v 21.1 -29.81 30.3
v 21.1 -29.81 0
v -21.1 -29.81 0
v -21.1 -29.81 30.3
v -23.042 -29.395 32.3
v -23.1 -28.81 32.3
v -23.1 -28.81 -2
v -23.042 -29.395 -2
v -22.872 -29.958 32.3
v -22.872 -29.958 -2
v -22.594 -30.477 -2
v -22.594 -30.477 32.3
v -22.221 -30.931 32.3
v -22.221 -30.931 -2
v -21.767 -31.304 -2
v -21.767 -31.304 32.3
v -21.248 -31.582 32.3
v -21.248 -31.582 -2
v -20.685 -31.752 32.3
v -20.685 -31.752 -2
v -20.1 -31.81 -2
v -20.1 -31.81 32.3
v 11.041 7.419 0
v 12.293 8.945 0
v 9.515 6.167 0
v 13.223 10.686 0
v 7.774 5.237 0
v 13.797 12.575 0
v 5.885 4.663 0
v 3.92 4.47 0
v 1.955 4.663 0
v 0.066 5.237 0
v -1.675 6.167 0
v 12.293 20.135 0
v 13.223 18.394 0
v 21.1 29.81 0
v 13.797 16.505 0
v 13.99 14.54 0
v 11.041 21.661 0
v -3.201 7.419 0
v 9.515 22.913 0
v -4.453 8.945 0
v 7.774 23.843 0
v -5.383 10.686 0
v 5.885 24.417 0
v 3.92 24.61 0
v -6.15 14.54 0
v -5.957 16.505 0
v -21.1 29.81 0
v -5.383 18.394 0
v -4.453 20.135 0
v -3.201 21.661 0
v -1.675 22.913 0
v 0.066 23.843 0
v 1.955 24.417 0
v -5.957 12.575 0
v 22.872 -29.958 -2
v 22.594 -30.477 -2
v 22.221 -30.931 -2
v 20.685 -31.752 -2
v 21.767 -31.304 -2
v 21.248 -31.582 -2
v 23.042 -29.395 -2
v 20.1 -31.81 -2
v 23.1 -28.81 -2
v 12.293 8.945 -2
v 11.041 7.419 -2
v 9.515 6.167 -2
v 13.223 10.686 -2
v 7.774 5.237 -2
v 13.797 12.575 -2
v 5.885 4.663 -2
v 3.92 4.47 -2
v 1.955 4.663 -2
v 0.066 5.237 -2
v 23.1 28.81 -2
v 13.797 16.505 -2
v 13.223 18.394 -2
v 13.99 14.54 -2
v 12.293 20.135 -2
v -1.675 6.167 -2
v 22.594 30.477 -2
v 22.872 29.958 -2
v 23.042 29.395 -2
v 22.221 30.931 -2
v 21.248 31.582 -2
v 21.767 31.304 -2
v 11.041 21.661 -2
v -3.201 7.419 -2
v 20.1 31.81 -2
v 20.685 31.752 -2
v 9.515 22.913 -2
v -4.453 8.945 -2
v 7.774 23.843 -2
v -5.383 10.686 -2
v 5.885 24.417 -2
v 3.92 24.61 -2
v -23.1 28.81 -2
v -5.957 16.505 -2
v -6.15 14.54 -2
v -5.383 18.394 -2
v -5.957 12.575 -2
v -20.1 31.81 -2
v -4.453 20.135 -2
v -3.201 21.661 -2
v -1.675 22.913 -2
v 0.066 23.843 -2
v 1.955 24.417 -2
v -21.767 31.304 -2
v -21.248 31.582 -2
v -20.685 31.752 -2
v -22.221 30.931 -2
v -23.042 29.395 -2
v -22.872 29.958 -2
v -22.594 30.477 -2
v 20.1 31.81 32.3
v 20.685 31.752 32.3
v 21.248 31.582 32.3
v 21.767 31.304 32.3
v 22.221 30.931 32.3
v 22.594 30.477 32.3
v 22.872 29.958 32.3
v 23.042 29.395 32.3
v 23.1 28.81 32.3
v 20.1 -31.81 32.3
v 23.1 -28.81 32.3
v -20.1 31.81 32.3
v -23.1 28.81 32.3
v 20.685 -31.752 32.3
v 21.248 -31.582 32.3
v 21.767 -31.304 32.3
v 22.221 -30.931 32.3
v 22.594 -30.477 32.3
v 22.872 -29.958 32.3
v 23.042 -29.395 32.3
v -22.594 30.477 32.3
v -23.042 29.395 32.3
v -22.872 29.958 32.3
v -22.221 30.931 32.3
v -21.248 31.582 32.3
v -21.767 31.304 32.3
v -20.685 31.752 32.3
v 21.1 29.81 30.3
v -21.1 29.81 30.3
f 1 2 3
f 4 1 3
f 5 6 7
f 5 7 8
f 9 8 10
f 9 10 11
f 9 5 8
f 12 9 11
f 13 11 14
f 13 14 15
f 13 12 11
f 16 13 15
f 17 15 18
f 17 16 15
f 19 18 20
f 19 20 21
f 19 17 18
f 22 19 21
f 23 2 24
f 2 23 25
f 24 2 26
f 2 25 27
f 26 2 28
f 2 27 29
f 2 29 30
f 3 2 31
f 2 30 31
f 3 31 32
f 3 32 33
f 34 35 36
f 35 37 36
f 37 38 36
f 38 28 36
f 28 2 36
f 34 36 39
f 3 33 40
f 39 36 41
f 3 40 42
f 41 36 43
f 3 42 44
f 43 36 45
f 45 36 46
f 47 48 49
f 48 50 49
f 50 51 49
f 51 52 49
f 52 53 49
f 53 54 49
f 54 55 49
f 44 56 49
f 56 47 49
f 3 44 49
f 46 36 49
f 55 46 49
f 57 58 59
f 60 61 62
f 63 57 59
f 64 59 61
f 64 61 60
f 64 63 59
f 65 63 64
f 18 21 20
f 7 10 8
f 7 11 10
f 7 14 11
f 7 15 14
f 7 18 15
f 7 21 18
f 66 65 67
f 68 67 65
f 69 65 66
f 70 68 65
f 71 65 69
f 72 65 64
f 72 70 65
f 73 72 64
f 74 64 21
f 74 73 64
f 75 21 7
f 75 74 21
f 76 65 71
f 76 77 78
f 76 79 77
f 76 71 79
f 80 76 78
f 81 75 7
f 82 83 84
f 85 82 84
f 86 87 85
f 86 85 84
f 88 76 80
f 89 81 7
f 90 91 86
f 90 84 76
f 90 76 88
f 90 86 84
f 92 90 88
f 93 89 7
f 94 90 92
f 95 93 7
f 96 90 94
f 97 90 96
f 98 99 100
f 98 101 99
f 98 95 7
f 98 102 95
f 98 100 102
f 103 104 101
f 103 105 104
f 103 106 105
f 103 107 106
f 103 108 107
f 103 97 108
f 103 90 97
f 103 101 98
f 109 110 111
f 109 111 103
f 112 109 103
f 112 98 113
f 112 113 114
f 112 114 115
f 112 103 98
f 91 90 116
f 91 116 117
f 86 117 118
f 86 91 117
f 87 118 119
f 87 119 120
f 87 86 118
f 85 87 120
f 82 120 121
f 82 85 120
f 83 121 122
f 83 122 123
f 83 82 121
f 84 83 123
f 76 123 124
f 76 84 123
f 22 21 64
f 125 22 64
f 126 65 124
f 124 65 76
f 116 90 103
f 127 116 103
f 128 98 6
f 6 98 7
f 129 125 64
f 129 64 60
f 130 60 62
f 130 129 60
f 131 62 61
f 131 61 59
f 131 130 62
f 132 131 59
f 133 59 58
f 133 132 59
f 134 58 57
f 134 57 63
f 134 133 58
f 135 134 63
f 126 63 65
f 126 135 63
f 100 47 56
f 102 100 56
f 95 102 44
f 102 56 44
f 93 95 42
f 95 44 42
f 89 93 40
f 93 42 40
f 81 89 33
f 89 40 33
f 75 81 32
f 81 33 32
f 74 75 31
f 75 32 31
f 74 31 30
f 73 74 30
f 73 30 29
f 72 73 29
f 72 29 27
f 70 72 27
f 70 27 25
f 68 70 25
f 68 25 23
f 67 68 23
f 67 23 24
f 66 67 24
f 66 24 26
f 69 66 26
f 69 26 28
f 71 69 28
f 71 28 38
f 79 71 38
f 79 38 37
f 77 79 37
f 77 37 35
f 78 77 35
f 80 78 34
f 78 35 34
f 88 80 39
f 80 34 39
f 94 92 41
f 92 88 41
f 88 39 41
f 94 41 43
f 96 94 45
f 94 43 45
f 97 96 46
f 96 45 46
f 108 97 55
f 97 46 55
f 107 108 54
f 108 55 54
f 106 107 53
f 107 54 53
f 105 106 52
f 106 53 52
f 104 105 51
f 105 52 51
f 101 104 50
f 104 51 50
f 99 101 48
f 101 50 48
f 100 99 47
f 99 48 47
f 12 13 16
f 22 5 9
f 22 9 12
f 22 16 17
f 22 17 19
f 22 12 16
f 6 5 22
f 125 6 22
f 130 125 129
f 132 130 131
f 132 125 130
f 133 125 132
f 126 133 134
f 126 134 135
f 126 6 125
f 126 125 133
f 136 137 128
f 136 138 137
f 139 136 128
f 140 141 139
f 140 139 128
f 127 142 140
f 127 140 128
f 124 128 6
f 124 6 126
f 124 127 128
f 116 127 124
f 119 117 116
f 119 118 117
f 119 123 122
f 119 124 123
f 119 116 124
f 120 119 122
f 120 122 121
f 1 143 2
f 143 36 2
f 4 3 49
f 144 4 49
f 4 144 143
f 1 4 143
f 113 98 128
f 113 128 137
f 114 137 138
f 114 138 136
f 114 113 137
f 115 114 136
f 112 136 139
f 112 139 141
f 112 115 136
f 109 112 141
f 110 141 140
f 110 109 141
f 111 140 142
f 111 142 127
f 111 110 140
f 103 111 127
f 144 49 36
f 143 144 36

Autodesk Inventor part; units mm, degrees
ref_plane "YZ Plane" through (0, 0, 0) normal (1, 0, 0) x (0, 1, 0)
ref_plane "XZ Plane" through (0, 0, 0) normal (0, 1, 0) x (-1, 0, 0)
ref_plane "XY Plane" through (0, 0, 0) normal (0, 0, 1) x (1, 0, 0)
sketch "Sketch1" plane through (0, 0, 0) normal (0, 0, 1) x (1, 0, 0)
  line L0 (-21.1, 29.81) -> (21.1, 29.81)
  line L1 (21.1, 29.81) -> (21.1, -29.81)
  line L2 (21.1, -29.81) -> (-21.1, -29.81)
  line L3 (-21.1, -29.81) -> (-21.1, 29.81)
  line L4 (0, 0) -> (0, 68.2086)
  line L5 (0, 0) -> (53.7664, 0)
  line L6 (-21.1, 29.81) -> (21.1, 29.81)
  line L7 (21.1, 29.81) -> (21.1, -29.81)
  line L8 (21.1, -29.81) -> (-21.1, -29.81)
  line L9 (-21.1, -29.81) -> (-21.1, 29.81)
  line L10 (0, 0) -> (0, 68.2086)
  line L11 (0, 0) -> (54.462, 0)
  line L12 (-23.1, 31.81) -> (23.1, 31.81)
  line L13 (23.1, 31.81) -> (23.1, -31.81)
  line L14 (23.1, -31.81) -> (-23.1, -31.81)
  line L15 (-23.1, -31.81) -> (-23.1, 31.81)
  line L16 (-26.1, 34.81) -> (26.1, 34.81)
  line L17 (26.1, 34.81) -> (26.1, -34.81)
  line L18 (26.1, -34.81) -> (-26.1, -34.81)
  line L19 (-26.1, -34.81) -> (-26.1, 34.81)
  dimension "d0" = 59.62
  dimension "d1" = 42.2
  dimension "d2" = 59.62
  dimension "d3" = 42.2
  dimension "d4" = 2
  dimension "d5" = 2
  dimension "d6" = 0
  dimension "d7" = 3
  dimension "d8" = 3
extrude "Extrusion1" add sketch "Sketch1" along normal blind 30.3 contours L3 L2 L1 L5 L13 L14 L15 L12 L4 L0 | L4 L12 L13 L5 L1 L0
sketch "Sketch2" plane through (0, 0, 30.3) normal (0, 0, 1) x (1, 0, 0)
  line L0 (-23.1, -31.81) -> (23.1, -31.81)
  line L1 (23.1, -31.81) -> (23.1, 31.81)
  line L2 (23.1, 31.81) -> (-23.1, 31.81)
  line L3 (-23.1, 31.81) -> (-23.1, -31.81)
  point P0 (0, 0)
extrude "Extrusion2" add sketch "Sketch2" along normal blind 2
sketch "Sketch3" plane through (0, 0, 0) normal (0, 0, -1) x (-1, 0, 0)
  line L0 (-23.1, -31.81) -> (23.1, -31.81) projected
  line L1 (23.1, -31.81) -> (23.1, 31.81) projected
  line L2 (23.1, 31.81) -> (-23.1, 31.81) projected
  line L3 (-23.1, 31.81) -> (-23.1, -31.81) projected
  circle A0 centre (-3.92, 14.54) radius 10.07
  line L4 (21.1, 29.81) -> (21.1, -29.81)
  line L5 (-21.1, 29.81) -> (21.1, 29.81)
  line L6 (-21.1, -29.81) -> (-21.1, 29.81)
  line L7 (21.1, -29.81) -> (-21.1, -29.81)
  point P0 (0, 0)
  point P1 (0, 0)
extrude "Extrusion3" add sketch "Sketch3" along normal blind 2 contours L3 L2 L1 L0 | L4 L7 L6 L5
fillet "Fillet3" radius 3 4 edges at (-23.1, -31.81, 15.15) (-23.1, 31.81, 15.15) (23.1, -31.81, 15.15) (23.1, 31.81, 15.15)
equation "\"d5\" = d4"
equation "\"d8\" = d7"
properties part number "Cam.Silicon.back" material "Silicone"
